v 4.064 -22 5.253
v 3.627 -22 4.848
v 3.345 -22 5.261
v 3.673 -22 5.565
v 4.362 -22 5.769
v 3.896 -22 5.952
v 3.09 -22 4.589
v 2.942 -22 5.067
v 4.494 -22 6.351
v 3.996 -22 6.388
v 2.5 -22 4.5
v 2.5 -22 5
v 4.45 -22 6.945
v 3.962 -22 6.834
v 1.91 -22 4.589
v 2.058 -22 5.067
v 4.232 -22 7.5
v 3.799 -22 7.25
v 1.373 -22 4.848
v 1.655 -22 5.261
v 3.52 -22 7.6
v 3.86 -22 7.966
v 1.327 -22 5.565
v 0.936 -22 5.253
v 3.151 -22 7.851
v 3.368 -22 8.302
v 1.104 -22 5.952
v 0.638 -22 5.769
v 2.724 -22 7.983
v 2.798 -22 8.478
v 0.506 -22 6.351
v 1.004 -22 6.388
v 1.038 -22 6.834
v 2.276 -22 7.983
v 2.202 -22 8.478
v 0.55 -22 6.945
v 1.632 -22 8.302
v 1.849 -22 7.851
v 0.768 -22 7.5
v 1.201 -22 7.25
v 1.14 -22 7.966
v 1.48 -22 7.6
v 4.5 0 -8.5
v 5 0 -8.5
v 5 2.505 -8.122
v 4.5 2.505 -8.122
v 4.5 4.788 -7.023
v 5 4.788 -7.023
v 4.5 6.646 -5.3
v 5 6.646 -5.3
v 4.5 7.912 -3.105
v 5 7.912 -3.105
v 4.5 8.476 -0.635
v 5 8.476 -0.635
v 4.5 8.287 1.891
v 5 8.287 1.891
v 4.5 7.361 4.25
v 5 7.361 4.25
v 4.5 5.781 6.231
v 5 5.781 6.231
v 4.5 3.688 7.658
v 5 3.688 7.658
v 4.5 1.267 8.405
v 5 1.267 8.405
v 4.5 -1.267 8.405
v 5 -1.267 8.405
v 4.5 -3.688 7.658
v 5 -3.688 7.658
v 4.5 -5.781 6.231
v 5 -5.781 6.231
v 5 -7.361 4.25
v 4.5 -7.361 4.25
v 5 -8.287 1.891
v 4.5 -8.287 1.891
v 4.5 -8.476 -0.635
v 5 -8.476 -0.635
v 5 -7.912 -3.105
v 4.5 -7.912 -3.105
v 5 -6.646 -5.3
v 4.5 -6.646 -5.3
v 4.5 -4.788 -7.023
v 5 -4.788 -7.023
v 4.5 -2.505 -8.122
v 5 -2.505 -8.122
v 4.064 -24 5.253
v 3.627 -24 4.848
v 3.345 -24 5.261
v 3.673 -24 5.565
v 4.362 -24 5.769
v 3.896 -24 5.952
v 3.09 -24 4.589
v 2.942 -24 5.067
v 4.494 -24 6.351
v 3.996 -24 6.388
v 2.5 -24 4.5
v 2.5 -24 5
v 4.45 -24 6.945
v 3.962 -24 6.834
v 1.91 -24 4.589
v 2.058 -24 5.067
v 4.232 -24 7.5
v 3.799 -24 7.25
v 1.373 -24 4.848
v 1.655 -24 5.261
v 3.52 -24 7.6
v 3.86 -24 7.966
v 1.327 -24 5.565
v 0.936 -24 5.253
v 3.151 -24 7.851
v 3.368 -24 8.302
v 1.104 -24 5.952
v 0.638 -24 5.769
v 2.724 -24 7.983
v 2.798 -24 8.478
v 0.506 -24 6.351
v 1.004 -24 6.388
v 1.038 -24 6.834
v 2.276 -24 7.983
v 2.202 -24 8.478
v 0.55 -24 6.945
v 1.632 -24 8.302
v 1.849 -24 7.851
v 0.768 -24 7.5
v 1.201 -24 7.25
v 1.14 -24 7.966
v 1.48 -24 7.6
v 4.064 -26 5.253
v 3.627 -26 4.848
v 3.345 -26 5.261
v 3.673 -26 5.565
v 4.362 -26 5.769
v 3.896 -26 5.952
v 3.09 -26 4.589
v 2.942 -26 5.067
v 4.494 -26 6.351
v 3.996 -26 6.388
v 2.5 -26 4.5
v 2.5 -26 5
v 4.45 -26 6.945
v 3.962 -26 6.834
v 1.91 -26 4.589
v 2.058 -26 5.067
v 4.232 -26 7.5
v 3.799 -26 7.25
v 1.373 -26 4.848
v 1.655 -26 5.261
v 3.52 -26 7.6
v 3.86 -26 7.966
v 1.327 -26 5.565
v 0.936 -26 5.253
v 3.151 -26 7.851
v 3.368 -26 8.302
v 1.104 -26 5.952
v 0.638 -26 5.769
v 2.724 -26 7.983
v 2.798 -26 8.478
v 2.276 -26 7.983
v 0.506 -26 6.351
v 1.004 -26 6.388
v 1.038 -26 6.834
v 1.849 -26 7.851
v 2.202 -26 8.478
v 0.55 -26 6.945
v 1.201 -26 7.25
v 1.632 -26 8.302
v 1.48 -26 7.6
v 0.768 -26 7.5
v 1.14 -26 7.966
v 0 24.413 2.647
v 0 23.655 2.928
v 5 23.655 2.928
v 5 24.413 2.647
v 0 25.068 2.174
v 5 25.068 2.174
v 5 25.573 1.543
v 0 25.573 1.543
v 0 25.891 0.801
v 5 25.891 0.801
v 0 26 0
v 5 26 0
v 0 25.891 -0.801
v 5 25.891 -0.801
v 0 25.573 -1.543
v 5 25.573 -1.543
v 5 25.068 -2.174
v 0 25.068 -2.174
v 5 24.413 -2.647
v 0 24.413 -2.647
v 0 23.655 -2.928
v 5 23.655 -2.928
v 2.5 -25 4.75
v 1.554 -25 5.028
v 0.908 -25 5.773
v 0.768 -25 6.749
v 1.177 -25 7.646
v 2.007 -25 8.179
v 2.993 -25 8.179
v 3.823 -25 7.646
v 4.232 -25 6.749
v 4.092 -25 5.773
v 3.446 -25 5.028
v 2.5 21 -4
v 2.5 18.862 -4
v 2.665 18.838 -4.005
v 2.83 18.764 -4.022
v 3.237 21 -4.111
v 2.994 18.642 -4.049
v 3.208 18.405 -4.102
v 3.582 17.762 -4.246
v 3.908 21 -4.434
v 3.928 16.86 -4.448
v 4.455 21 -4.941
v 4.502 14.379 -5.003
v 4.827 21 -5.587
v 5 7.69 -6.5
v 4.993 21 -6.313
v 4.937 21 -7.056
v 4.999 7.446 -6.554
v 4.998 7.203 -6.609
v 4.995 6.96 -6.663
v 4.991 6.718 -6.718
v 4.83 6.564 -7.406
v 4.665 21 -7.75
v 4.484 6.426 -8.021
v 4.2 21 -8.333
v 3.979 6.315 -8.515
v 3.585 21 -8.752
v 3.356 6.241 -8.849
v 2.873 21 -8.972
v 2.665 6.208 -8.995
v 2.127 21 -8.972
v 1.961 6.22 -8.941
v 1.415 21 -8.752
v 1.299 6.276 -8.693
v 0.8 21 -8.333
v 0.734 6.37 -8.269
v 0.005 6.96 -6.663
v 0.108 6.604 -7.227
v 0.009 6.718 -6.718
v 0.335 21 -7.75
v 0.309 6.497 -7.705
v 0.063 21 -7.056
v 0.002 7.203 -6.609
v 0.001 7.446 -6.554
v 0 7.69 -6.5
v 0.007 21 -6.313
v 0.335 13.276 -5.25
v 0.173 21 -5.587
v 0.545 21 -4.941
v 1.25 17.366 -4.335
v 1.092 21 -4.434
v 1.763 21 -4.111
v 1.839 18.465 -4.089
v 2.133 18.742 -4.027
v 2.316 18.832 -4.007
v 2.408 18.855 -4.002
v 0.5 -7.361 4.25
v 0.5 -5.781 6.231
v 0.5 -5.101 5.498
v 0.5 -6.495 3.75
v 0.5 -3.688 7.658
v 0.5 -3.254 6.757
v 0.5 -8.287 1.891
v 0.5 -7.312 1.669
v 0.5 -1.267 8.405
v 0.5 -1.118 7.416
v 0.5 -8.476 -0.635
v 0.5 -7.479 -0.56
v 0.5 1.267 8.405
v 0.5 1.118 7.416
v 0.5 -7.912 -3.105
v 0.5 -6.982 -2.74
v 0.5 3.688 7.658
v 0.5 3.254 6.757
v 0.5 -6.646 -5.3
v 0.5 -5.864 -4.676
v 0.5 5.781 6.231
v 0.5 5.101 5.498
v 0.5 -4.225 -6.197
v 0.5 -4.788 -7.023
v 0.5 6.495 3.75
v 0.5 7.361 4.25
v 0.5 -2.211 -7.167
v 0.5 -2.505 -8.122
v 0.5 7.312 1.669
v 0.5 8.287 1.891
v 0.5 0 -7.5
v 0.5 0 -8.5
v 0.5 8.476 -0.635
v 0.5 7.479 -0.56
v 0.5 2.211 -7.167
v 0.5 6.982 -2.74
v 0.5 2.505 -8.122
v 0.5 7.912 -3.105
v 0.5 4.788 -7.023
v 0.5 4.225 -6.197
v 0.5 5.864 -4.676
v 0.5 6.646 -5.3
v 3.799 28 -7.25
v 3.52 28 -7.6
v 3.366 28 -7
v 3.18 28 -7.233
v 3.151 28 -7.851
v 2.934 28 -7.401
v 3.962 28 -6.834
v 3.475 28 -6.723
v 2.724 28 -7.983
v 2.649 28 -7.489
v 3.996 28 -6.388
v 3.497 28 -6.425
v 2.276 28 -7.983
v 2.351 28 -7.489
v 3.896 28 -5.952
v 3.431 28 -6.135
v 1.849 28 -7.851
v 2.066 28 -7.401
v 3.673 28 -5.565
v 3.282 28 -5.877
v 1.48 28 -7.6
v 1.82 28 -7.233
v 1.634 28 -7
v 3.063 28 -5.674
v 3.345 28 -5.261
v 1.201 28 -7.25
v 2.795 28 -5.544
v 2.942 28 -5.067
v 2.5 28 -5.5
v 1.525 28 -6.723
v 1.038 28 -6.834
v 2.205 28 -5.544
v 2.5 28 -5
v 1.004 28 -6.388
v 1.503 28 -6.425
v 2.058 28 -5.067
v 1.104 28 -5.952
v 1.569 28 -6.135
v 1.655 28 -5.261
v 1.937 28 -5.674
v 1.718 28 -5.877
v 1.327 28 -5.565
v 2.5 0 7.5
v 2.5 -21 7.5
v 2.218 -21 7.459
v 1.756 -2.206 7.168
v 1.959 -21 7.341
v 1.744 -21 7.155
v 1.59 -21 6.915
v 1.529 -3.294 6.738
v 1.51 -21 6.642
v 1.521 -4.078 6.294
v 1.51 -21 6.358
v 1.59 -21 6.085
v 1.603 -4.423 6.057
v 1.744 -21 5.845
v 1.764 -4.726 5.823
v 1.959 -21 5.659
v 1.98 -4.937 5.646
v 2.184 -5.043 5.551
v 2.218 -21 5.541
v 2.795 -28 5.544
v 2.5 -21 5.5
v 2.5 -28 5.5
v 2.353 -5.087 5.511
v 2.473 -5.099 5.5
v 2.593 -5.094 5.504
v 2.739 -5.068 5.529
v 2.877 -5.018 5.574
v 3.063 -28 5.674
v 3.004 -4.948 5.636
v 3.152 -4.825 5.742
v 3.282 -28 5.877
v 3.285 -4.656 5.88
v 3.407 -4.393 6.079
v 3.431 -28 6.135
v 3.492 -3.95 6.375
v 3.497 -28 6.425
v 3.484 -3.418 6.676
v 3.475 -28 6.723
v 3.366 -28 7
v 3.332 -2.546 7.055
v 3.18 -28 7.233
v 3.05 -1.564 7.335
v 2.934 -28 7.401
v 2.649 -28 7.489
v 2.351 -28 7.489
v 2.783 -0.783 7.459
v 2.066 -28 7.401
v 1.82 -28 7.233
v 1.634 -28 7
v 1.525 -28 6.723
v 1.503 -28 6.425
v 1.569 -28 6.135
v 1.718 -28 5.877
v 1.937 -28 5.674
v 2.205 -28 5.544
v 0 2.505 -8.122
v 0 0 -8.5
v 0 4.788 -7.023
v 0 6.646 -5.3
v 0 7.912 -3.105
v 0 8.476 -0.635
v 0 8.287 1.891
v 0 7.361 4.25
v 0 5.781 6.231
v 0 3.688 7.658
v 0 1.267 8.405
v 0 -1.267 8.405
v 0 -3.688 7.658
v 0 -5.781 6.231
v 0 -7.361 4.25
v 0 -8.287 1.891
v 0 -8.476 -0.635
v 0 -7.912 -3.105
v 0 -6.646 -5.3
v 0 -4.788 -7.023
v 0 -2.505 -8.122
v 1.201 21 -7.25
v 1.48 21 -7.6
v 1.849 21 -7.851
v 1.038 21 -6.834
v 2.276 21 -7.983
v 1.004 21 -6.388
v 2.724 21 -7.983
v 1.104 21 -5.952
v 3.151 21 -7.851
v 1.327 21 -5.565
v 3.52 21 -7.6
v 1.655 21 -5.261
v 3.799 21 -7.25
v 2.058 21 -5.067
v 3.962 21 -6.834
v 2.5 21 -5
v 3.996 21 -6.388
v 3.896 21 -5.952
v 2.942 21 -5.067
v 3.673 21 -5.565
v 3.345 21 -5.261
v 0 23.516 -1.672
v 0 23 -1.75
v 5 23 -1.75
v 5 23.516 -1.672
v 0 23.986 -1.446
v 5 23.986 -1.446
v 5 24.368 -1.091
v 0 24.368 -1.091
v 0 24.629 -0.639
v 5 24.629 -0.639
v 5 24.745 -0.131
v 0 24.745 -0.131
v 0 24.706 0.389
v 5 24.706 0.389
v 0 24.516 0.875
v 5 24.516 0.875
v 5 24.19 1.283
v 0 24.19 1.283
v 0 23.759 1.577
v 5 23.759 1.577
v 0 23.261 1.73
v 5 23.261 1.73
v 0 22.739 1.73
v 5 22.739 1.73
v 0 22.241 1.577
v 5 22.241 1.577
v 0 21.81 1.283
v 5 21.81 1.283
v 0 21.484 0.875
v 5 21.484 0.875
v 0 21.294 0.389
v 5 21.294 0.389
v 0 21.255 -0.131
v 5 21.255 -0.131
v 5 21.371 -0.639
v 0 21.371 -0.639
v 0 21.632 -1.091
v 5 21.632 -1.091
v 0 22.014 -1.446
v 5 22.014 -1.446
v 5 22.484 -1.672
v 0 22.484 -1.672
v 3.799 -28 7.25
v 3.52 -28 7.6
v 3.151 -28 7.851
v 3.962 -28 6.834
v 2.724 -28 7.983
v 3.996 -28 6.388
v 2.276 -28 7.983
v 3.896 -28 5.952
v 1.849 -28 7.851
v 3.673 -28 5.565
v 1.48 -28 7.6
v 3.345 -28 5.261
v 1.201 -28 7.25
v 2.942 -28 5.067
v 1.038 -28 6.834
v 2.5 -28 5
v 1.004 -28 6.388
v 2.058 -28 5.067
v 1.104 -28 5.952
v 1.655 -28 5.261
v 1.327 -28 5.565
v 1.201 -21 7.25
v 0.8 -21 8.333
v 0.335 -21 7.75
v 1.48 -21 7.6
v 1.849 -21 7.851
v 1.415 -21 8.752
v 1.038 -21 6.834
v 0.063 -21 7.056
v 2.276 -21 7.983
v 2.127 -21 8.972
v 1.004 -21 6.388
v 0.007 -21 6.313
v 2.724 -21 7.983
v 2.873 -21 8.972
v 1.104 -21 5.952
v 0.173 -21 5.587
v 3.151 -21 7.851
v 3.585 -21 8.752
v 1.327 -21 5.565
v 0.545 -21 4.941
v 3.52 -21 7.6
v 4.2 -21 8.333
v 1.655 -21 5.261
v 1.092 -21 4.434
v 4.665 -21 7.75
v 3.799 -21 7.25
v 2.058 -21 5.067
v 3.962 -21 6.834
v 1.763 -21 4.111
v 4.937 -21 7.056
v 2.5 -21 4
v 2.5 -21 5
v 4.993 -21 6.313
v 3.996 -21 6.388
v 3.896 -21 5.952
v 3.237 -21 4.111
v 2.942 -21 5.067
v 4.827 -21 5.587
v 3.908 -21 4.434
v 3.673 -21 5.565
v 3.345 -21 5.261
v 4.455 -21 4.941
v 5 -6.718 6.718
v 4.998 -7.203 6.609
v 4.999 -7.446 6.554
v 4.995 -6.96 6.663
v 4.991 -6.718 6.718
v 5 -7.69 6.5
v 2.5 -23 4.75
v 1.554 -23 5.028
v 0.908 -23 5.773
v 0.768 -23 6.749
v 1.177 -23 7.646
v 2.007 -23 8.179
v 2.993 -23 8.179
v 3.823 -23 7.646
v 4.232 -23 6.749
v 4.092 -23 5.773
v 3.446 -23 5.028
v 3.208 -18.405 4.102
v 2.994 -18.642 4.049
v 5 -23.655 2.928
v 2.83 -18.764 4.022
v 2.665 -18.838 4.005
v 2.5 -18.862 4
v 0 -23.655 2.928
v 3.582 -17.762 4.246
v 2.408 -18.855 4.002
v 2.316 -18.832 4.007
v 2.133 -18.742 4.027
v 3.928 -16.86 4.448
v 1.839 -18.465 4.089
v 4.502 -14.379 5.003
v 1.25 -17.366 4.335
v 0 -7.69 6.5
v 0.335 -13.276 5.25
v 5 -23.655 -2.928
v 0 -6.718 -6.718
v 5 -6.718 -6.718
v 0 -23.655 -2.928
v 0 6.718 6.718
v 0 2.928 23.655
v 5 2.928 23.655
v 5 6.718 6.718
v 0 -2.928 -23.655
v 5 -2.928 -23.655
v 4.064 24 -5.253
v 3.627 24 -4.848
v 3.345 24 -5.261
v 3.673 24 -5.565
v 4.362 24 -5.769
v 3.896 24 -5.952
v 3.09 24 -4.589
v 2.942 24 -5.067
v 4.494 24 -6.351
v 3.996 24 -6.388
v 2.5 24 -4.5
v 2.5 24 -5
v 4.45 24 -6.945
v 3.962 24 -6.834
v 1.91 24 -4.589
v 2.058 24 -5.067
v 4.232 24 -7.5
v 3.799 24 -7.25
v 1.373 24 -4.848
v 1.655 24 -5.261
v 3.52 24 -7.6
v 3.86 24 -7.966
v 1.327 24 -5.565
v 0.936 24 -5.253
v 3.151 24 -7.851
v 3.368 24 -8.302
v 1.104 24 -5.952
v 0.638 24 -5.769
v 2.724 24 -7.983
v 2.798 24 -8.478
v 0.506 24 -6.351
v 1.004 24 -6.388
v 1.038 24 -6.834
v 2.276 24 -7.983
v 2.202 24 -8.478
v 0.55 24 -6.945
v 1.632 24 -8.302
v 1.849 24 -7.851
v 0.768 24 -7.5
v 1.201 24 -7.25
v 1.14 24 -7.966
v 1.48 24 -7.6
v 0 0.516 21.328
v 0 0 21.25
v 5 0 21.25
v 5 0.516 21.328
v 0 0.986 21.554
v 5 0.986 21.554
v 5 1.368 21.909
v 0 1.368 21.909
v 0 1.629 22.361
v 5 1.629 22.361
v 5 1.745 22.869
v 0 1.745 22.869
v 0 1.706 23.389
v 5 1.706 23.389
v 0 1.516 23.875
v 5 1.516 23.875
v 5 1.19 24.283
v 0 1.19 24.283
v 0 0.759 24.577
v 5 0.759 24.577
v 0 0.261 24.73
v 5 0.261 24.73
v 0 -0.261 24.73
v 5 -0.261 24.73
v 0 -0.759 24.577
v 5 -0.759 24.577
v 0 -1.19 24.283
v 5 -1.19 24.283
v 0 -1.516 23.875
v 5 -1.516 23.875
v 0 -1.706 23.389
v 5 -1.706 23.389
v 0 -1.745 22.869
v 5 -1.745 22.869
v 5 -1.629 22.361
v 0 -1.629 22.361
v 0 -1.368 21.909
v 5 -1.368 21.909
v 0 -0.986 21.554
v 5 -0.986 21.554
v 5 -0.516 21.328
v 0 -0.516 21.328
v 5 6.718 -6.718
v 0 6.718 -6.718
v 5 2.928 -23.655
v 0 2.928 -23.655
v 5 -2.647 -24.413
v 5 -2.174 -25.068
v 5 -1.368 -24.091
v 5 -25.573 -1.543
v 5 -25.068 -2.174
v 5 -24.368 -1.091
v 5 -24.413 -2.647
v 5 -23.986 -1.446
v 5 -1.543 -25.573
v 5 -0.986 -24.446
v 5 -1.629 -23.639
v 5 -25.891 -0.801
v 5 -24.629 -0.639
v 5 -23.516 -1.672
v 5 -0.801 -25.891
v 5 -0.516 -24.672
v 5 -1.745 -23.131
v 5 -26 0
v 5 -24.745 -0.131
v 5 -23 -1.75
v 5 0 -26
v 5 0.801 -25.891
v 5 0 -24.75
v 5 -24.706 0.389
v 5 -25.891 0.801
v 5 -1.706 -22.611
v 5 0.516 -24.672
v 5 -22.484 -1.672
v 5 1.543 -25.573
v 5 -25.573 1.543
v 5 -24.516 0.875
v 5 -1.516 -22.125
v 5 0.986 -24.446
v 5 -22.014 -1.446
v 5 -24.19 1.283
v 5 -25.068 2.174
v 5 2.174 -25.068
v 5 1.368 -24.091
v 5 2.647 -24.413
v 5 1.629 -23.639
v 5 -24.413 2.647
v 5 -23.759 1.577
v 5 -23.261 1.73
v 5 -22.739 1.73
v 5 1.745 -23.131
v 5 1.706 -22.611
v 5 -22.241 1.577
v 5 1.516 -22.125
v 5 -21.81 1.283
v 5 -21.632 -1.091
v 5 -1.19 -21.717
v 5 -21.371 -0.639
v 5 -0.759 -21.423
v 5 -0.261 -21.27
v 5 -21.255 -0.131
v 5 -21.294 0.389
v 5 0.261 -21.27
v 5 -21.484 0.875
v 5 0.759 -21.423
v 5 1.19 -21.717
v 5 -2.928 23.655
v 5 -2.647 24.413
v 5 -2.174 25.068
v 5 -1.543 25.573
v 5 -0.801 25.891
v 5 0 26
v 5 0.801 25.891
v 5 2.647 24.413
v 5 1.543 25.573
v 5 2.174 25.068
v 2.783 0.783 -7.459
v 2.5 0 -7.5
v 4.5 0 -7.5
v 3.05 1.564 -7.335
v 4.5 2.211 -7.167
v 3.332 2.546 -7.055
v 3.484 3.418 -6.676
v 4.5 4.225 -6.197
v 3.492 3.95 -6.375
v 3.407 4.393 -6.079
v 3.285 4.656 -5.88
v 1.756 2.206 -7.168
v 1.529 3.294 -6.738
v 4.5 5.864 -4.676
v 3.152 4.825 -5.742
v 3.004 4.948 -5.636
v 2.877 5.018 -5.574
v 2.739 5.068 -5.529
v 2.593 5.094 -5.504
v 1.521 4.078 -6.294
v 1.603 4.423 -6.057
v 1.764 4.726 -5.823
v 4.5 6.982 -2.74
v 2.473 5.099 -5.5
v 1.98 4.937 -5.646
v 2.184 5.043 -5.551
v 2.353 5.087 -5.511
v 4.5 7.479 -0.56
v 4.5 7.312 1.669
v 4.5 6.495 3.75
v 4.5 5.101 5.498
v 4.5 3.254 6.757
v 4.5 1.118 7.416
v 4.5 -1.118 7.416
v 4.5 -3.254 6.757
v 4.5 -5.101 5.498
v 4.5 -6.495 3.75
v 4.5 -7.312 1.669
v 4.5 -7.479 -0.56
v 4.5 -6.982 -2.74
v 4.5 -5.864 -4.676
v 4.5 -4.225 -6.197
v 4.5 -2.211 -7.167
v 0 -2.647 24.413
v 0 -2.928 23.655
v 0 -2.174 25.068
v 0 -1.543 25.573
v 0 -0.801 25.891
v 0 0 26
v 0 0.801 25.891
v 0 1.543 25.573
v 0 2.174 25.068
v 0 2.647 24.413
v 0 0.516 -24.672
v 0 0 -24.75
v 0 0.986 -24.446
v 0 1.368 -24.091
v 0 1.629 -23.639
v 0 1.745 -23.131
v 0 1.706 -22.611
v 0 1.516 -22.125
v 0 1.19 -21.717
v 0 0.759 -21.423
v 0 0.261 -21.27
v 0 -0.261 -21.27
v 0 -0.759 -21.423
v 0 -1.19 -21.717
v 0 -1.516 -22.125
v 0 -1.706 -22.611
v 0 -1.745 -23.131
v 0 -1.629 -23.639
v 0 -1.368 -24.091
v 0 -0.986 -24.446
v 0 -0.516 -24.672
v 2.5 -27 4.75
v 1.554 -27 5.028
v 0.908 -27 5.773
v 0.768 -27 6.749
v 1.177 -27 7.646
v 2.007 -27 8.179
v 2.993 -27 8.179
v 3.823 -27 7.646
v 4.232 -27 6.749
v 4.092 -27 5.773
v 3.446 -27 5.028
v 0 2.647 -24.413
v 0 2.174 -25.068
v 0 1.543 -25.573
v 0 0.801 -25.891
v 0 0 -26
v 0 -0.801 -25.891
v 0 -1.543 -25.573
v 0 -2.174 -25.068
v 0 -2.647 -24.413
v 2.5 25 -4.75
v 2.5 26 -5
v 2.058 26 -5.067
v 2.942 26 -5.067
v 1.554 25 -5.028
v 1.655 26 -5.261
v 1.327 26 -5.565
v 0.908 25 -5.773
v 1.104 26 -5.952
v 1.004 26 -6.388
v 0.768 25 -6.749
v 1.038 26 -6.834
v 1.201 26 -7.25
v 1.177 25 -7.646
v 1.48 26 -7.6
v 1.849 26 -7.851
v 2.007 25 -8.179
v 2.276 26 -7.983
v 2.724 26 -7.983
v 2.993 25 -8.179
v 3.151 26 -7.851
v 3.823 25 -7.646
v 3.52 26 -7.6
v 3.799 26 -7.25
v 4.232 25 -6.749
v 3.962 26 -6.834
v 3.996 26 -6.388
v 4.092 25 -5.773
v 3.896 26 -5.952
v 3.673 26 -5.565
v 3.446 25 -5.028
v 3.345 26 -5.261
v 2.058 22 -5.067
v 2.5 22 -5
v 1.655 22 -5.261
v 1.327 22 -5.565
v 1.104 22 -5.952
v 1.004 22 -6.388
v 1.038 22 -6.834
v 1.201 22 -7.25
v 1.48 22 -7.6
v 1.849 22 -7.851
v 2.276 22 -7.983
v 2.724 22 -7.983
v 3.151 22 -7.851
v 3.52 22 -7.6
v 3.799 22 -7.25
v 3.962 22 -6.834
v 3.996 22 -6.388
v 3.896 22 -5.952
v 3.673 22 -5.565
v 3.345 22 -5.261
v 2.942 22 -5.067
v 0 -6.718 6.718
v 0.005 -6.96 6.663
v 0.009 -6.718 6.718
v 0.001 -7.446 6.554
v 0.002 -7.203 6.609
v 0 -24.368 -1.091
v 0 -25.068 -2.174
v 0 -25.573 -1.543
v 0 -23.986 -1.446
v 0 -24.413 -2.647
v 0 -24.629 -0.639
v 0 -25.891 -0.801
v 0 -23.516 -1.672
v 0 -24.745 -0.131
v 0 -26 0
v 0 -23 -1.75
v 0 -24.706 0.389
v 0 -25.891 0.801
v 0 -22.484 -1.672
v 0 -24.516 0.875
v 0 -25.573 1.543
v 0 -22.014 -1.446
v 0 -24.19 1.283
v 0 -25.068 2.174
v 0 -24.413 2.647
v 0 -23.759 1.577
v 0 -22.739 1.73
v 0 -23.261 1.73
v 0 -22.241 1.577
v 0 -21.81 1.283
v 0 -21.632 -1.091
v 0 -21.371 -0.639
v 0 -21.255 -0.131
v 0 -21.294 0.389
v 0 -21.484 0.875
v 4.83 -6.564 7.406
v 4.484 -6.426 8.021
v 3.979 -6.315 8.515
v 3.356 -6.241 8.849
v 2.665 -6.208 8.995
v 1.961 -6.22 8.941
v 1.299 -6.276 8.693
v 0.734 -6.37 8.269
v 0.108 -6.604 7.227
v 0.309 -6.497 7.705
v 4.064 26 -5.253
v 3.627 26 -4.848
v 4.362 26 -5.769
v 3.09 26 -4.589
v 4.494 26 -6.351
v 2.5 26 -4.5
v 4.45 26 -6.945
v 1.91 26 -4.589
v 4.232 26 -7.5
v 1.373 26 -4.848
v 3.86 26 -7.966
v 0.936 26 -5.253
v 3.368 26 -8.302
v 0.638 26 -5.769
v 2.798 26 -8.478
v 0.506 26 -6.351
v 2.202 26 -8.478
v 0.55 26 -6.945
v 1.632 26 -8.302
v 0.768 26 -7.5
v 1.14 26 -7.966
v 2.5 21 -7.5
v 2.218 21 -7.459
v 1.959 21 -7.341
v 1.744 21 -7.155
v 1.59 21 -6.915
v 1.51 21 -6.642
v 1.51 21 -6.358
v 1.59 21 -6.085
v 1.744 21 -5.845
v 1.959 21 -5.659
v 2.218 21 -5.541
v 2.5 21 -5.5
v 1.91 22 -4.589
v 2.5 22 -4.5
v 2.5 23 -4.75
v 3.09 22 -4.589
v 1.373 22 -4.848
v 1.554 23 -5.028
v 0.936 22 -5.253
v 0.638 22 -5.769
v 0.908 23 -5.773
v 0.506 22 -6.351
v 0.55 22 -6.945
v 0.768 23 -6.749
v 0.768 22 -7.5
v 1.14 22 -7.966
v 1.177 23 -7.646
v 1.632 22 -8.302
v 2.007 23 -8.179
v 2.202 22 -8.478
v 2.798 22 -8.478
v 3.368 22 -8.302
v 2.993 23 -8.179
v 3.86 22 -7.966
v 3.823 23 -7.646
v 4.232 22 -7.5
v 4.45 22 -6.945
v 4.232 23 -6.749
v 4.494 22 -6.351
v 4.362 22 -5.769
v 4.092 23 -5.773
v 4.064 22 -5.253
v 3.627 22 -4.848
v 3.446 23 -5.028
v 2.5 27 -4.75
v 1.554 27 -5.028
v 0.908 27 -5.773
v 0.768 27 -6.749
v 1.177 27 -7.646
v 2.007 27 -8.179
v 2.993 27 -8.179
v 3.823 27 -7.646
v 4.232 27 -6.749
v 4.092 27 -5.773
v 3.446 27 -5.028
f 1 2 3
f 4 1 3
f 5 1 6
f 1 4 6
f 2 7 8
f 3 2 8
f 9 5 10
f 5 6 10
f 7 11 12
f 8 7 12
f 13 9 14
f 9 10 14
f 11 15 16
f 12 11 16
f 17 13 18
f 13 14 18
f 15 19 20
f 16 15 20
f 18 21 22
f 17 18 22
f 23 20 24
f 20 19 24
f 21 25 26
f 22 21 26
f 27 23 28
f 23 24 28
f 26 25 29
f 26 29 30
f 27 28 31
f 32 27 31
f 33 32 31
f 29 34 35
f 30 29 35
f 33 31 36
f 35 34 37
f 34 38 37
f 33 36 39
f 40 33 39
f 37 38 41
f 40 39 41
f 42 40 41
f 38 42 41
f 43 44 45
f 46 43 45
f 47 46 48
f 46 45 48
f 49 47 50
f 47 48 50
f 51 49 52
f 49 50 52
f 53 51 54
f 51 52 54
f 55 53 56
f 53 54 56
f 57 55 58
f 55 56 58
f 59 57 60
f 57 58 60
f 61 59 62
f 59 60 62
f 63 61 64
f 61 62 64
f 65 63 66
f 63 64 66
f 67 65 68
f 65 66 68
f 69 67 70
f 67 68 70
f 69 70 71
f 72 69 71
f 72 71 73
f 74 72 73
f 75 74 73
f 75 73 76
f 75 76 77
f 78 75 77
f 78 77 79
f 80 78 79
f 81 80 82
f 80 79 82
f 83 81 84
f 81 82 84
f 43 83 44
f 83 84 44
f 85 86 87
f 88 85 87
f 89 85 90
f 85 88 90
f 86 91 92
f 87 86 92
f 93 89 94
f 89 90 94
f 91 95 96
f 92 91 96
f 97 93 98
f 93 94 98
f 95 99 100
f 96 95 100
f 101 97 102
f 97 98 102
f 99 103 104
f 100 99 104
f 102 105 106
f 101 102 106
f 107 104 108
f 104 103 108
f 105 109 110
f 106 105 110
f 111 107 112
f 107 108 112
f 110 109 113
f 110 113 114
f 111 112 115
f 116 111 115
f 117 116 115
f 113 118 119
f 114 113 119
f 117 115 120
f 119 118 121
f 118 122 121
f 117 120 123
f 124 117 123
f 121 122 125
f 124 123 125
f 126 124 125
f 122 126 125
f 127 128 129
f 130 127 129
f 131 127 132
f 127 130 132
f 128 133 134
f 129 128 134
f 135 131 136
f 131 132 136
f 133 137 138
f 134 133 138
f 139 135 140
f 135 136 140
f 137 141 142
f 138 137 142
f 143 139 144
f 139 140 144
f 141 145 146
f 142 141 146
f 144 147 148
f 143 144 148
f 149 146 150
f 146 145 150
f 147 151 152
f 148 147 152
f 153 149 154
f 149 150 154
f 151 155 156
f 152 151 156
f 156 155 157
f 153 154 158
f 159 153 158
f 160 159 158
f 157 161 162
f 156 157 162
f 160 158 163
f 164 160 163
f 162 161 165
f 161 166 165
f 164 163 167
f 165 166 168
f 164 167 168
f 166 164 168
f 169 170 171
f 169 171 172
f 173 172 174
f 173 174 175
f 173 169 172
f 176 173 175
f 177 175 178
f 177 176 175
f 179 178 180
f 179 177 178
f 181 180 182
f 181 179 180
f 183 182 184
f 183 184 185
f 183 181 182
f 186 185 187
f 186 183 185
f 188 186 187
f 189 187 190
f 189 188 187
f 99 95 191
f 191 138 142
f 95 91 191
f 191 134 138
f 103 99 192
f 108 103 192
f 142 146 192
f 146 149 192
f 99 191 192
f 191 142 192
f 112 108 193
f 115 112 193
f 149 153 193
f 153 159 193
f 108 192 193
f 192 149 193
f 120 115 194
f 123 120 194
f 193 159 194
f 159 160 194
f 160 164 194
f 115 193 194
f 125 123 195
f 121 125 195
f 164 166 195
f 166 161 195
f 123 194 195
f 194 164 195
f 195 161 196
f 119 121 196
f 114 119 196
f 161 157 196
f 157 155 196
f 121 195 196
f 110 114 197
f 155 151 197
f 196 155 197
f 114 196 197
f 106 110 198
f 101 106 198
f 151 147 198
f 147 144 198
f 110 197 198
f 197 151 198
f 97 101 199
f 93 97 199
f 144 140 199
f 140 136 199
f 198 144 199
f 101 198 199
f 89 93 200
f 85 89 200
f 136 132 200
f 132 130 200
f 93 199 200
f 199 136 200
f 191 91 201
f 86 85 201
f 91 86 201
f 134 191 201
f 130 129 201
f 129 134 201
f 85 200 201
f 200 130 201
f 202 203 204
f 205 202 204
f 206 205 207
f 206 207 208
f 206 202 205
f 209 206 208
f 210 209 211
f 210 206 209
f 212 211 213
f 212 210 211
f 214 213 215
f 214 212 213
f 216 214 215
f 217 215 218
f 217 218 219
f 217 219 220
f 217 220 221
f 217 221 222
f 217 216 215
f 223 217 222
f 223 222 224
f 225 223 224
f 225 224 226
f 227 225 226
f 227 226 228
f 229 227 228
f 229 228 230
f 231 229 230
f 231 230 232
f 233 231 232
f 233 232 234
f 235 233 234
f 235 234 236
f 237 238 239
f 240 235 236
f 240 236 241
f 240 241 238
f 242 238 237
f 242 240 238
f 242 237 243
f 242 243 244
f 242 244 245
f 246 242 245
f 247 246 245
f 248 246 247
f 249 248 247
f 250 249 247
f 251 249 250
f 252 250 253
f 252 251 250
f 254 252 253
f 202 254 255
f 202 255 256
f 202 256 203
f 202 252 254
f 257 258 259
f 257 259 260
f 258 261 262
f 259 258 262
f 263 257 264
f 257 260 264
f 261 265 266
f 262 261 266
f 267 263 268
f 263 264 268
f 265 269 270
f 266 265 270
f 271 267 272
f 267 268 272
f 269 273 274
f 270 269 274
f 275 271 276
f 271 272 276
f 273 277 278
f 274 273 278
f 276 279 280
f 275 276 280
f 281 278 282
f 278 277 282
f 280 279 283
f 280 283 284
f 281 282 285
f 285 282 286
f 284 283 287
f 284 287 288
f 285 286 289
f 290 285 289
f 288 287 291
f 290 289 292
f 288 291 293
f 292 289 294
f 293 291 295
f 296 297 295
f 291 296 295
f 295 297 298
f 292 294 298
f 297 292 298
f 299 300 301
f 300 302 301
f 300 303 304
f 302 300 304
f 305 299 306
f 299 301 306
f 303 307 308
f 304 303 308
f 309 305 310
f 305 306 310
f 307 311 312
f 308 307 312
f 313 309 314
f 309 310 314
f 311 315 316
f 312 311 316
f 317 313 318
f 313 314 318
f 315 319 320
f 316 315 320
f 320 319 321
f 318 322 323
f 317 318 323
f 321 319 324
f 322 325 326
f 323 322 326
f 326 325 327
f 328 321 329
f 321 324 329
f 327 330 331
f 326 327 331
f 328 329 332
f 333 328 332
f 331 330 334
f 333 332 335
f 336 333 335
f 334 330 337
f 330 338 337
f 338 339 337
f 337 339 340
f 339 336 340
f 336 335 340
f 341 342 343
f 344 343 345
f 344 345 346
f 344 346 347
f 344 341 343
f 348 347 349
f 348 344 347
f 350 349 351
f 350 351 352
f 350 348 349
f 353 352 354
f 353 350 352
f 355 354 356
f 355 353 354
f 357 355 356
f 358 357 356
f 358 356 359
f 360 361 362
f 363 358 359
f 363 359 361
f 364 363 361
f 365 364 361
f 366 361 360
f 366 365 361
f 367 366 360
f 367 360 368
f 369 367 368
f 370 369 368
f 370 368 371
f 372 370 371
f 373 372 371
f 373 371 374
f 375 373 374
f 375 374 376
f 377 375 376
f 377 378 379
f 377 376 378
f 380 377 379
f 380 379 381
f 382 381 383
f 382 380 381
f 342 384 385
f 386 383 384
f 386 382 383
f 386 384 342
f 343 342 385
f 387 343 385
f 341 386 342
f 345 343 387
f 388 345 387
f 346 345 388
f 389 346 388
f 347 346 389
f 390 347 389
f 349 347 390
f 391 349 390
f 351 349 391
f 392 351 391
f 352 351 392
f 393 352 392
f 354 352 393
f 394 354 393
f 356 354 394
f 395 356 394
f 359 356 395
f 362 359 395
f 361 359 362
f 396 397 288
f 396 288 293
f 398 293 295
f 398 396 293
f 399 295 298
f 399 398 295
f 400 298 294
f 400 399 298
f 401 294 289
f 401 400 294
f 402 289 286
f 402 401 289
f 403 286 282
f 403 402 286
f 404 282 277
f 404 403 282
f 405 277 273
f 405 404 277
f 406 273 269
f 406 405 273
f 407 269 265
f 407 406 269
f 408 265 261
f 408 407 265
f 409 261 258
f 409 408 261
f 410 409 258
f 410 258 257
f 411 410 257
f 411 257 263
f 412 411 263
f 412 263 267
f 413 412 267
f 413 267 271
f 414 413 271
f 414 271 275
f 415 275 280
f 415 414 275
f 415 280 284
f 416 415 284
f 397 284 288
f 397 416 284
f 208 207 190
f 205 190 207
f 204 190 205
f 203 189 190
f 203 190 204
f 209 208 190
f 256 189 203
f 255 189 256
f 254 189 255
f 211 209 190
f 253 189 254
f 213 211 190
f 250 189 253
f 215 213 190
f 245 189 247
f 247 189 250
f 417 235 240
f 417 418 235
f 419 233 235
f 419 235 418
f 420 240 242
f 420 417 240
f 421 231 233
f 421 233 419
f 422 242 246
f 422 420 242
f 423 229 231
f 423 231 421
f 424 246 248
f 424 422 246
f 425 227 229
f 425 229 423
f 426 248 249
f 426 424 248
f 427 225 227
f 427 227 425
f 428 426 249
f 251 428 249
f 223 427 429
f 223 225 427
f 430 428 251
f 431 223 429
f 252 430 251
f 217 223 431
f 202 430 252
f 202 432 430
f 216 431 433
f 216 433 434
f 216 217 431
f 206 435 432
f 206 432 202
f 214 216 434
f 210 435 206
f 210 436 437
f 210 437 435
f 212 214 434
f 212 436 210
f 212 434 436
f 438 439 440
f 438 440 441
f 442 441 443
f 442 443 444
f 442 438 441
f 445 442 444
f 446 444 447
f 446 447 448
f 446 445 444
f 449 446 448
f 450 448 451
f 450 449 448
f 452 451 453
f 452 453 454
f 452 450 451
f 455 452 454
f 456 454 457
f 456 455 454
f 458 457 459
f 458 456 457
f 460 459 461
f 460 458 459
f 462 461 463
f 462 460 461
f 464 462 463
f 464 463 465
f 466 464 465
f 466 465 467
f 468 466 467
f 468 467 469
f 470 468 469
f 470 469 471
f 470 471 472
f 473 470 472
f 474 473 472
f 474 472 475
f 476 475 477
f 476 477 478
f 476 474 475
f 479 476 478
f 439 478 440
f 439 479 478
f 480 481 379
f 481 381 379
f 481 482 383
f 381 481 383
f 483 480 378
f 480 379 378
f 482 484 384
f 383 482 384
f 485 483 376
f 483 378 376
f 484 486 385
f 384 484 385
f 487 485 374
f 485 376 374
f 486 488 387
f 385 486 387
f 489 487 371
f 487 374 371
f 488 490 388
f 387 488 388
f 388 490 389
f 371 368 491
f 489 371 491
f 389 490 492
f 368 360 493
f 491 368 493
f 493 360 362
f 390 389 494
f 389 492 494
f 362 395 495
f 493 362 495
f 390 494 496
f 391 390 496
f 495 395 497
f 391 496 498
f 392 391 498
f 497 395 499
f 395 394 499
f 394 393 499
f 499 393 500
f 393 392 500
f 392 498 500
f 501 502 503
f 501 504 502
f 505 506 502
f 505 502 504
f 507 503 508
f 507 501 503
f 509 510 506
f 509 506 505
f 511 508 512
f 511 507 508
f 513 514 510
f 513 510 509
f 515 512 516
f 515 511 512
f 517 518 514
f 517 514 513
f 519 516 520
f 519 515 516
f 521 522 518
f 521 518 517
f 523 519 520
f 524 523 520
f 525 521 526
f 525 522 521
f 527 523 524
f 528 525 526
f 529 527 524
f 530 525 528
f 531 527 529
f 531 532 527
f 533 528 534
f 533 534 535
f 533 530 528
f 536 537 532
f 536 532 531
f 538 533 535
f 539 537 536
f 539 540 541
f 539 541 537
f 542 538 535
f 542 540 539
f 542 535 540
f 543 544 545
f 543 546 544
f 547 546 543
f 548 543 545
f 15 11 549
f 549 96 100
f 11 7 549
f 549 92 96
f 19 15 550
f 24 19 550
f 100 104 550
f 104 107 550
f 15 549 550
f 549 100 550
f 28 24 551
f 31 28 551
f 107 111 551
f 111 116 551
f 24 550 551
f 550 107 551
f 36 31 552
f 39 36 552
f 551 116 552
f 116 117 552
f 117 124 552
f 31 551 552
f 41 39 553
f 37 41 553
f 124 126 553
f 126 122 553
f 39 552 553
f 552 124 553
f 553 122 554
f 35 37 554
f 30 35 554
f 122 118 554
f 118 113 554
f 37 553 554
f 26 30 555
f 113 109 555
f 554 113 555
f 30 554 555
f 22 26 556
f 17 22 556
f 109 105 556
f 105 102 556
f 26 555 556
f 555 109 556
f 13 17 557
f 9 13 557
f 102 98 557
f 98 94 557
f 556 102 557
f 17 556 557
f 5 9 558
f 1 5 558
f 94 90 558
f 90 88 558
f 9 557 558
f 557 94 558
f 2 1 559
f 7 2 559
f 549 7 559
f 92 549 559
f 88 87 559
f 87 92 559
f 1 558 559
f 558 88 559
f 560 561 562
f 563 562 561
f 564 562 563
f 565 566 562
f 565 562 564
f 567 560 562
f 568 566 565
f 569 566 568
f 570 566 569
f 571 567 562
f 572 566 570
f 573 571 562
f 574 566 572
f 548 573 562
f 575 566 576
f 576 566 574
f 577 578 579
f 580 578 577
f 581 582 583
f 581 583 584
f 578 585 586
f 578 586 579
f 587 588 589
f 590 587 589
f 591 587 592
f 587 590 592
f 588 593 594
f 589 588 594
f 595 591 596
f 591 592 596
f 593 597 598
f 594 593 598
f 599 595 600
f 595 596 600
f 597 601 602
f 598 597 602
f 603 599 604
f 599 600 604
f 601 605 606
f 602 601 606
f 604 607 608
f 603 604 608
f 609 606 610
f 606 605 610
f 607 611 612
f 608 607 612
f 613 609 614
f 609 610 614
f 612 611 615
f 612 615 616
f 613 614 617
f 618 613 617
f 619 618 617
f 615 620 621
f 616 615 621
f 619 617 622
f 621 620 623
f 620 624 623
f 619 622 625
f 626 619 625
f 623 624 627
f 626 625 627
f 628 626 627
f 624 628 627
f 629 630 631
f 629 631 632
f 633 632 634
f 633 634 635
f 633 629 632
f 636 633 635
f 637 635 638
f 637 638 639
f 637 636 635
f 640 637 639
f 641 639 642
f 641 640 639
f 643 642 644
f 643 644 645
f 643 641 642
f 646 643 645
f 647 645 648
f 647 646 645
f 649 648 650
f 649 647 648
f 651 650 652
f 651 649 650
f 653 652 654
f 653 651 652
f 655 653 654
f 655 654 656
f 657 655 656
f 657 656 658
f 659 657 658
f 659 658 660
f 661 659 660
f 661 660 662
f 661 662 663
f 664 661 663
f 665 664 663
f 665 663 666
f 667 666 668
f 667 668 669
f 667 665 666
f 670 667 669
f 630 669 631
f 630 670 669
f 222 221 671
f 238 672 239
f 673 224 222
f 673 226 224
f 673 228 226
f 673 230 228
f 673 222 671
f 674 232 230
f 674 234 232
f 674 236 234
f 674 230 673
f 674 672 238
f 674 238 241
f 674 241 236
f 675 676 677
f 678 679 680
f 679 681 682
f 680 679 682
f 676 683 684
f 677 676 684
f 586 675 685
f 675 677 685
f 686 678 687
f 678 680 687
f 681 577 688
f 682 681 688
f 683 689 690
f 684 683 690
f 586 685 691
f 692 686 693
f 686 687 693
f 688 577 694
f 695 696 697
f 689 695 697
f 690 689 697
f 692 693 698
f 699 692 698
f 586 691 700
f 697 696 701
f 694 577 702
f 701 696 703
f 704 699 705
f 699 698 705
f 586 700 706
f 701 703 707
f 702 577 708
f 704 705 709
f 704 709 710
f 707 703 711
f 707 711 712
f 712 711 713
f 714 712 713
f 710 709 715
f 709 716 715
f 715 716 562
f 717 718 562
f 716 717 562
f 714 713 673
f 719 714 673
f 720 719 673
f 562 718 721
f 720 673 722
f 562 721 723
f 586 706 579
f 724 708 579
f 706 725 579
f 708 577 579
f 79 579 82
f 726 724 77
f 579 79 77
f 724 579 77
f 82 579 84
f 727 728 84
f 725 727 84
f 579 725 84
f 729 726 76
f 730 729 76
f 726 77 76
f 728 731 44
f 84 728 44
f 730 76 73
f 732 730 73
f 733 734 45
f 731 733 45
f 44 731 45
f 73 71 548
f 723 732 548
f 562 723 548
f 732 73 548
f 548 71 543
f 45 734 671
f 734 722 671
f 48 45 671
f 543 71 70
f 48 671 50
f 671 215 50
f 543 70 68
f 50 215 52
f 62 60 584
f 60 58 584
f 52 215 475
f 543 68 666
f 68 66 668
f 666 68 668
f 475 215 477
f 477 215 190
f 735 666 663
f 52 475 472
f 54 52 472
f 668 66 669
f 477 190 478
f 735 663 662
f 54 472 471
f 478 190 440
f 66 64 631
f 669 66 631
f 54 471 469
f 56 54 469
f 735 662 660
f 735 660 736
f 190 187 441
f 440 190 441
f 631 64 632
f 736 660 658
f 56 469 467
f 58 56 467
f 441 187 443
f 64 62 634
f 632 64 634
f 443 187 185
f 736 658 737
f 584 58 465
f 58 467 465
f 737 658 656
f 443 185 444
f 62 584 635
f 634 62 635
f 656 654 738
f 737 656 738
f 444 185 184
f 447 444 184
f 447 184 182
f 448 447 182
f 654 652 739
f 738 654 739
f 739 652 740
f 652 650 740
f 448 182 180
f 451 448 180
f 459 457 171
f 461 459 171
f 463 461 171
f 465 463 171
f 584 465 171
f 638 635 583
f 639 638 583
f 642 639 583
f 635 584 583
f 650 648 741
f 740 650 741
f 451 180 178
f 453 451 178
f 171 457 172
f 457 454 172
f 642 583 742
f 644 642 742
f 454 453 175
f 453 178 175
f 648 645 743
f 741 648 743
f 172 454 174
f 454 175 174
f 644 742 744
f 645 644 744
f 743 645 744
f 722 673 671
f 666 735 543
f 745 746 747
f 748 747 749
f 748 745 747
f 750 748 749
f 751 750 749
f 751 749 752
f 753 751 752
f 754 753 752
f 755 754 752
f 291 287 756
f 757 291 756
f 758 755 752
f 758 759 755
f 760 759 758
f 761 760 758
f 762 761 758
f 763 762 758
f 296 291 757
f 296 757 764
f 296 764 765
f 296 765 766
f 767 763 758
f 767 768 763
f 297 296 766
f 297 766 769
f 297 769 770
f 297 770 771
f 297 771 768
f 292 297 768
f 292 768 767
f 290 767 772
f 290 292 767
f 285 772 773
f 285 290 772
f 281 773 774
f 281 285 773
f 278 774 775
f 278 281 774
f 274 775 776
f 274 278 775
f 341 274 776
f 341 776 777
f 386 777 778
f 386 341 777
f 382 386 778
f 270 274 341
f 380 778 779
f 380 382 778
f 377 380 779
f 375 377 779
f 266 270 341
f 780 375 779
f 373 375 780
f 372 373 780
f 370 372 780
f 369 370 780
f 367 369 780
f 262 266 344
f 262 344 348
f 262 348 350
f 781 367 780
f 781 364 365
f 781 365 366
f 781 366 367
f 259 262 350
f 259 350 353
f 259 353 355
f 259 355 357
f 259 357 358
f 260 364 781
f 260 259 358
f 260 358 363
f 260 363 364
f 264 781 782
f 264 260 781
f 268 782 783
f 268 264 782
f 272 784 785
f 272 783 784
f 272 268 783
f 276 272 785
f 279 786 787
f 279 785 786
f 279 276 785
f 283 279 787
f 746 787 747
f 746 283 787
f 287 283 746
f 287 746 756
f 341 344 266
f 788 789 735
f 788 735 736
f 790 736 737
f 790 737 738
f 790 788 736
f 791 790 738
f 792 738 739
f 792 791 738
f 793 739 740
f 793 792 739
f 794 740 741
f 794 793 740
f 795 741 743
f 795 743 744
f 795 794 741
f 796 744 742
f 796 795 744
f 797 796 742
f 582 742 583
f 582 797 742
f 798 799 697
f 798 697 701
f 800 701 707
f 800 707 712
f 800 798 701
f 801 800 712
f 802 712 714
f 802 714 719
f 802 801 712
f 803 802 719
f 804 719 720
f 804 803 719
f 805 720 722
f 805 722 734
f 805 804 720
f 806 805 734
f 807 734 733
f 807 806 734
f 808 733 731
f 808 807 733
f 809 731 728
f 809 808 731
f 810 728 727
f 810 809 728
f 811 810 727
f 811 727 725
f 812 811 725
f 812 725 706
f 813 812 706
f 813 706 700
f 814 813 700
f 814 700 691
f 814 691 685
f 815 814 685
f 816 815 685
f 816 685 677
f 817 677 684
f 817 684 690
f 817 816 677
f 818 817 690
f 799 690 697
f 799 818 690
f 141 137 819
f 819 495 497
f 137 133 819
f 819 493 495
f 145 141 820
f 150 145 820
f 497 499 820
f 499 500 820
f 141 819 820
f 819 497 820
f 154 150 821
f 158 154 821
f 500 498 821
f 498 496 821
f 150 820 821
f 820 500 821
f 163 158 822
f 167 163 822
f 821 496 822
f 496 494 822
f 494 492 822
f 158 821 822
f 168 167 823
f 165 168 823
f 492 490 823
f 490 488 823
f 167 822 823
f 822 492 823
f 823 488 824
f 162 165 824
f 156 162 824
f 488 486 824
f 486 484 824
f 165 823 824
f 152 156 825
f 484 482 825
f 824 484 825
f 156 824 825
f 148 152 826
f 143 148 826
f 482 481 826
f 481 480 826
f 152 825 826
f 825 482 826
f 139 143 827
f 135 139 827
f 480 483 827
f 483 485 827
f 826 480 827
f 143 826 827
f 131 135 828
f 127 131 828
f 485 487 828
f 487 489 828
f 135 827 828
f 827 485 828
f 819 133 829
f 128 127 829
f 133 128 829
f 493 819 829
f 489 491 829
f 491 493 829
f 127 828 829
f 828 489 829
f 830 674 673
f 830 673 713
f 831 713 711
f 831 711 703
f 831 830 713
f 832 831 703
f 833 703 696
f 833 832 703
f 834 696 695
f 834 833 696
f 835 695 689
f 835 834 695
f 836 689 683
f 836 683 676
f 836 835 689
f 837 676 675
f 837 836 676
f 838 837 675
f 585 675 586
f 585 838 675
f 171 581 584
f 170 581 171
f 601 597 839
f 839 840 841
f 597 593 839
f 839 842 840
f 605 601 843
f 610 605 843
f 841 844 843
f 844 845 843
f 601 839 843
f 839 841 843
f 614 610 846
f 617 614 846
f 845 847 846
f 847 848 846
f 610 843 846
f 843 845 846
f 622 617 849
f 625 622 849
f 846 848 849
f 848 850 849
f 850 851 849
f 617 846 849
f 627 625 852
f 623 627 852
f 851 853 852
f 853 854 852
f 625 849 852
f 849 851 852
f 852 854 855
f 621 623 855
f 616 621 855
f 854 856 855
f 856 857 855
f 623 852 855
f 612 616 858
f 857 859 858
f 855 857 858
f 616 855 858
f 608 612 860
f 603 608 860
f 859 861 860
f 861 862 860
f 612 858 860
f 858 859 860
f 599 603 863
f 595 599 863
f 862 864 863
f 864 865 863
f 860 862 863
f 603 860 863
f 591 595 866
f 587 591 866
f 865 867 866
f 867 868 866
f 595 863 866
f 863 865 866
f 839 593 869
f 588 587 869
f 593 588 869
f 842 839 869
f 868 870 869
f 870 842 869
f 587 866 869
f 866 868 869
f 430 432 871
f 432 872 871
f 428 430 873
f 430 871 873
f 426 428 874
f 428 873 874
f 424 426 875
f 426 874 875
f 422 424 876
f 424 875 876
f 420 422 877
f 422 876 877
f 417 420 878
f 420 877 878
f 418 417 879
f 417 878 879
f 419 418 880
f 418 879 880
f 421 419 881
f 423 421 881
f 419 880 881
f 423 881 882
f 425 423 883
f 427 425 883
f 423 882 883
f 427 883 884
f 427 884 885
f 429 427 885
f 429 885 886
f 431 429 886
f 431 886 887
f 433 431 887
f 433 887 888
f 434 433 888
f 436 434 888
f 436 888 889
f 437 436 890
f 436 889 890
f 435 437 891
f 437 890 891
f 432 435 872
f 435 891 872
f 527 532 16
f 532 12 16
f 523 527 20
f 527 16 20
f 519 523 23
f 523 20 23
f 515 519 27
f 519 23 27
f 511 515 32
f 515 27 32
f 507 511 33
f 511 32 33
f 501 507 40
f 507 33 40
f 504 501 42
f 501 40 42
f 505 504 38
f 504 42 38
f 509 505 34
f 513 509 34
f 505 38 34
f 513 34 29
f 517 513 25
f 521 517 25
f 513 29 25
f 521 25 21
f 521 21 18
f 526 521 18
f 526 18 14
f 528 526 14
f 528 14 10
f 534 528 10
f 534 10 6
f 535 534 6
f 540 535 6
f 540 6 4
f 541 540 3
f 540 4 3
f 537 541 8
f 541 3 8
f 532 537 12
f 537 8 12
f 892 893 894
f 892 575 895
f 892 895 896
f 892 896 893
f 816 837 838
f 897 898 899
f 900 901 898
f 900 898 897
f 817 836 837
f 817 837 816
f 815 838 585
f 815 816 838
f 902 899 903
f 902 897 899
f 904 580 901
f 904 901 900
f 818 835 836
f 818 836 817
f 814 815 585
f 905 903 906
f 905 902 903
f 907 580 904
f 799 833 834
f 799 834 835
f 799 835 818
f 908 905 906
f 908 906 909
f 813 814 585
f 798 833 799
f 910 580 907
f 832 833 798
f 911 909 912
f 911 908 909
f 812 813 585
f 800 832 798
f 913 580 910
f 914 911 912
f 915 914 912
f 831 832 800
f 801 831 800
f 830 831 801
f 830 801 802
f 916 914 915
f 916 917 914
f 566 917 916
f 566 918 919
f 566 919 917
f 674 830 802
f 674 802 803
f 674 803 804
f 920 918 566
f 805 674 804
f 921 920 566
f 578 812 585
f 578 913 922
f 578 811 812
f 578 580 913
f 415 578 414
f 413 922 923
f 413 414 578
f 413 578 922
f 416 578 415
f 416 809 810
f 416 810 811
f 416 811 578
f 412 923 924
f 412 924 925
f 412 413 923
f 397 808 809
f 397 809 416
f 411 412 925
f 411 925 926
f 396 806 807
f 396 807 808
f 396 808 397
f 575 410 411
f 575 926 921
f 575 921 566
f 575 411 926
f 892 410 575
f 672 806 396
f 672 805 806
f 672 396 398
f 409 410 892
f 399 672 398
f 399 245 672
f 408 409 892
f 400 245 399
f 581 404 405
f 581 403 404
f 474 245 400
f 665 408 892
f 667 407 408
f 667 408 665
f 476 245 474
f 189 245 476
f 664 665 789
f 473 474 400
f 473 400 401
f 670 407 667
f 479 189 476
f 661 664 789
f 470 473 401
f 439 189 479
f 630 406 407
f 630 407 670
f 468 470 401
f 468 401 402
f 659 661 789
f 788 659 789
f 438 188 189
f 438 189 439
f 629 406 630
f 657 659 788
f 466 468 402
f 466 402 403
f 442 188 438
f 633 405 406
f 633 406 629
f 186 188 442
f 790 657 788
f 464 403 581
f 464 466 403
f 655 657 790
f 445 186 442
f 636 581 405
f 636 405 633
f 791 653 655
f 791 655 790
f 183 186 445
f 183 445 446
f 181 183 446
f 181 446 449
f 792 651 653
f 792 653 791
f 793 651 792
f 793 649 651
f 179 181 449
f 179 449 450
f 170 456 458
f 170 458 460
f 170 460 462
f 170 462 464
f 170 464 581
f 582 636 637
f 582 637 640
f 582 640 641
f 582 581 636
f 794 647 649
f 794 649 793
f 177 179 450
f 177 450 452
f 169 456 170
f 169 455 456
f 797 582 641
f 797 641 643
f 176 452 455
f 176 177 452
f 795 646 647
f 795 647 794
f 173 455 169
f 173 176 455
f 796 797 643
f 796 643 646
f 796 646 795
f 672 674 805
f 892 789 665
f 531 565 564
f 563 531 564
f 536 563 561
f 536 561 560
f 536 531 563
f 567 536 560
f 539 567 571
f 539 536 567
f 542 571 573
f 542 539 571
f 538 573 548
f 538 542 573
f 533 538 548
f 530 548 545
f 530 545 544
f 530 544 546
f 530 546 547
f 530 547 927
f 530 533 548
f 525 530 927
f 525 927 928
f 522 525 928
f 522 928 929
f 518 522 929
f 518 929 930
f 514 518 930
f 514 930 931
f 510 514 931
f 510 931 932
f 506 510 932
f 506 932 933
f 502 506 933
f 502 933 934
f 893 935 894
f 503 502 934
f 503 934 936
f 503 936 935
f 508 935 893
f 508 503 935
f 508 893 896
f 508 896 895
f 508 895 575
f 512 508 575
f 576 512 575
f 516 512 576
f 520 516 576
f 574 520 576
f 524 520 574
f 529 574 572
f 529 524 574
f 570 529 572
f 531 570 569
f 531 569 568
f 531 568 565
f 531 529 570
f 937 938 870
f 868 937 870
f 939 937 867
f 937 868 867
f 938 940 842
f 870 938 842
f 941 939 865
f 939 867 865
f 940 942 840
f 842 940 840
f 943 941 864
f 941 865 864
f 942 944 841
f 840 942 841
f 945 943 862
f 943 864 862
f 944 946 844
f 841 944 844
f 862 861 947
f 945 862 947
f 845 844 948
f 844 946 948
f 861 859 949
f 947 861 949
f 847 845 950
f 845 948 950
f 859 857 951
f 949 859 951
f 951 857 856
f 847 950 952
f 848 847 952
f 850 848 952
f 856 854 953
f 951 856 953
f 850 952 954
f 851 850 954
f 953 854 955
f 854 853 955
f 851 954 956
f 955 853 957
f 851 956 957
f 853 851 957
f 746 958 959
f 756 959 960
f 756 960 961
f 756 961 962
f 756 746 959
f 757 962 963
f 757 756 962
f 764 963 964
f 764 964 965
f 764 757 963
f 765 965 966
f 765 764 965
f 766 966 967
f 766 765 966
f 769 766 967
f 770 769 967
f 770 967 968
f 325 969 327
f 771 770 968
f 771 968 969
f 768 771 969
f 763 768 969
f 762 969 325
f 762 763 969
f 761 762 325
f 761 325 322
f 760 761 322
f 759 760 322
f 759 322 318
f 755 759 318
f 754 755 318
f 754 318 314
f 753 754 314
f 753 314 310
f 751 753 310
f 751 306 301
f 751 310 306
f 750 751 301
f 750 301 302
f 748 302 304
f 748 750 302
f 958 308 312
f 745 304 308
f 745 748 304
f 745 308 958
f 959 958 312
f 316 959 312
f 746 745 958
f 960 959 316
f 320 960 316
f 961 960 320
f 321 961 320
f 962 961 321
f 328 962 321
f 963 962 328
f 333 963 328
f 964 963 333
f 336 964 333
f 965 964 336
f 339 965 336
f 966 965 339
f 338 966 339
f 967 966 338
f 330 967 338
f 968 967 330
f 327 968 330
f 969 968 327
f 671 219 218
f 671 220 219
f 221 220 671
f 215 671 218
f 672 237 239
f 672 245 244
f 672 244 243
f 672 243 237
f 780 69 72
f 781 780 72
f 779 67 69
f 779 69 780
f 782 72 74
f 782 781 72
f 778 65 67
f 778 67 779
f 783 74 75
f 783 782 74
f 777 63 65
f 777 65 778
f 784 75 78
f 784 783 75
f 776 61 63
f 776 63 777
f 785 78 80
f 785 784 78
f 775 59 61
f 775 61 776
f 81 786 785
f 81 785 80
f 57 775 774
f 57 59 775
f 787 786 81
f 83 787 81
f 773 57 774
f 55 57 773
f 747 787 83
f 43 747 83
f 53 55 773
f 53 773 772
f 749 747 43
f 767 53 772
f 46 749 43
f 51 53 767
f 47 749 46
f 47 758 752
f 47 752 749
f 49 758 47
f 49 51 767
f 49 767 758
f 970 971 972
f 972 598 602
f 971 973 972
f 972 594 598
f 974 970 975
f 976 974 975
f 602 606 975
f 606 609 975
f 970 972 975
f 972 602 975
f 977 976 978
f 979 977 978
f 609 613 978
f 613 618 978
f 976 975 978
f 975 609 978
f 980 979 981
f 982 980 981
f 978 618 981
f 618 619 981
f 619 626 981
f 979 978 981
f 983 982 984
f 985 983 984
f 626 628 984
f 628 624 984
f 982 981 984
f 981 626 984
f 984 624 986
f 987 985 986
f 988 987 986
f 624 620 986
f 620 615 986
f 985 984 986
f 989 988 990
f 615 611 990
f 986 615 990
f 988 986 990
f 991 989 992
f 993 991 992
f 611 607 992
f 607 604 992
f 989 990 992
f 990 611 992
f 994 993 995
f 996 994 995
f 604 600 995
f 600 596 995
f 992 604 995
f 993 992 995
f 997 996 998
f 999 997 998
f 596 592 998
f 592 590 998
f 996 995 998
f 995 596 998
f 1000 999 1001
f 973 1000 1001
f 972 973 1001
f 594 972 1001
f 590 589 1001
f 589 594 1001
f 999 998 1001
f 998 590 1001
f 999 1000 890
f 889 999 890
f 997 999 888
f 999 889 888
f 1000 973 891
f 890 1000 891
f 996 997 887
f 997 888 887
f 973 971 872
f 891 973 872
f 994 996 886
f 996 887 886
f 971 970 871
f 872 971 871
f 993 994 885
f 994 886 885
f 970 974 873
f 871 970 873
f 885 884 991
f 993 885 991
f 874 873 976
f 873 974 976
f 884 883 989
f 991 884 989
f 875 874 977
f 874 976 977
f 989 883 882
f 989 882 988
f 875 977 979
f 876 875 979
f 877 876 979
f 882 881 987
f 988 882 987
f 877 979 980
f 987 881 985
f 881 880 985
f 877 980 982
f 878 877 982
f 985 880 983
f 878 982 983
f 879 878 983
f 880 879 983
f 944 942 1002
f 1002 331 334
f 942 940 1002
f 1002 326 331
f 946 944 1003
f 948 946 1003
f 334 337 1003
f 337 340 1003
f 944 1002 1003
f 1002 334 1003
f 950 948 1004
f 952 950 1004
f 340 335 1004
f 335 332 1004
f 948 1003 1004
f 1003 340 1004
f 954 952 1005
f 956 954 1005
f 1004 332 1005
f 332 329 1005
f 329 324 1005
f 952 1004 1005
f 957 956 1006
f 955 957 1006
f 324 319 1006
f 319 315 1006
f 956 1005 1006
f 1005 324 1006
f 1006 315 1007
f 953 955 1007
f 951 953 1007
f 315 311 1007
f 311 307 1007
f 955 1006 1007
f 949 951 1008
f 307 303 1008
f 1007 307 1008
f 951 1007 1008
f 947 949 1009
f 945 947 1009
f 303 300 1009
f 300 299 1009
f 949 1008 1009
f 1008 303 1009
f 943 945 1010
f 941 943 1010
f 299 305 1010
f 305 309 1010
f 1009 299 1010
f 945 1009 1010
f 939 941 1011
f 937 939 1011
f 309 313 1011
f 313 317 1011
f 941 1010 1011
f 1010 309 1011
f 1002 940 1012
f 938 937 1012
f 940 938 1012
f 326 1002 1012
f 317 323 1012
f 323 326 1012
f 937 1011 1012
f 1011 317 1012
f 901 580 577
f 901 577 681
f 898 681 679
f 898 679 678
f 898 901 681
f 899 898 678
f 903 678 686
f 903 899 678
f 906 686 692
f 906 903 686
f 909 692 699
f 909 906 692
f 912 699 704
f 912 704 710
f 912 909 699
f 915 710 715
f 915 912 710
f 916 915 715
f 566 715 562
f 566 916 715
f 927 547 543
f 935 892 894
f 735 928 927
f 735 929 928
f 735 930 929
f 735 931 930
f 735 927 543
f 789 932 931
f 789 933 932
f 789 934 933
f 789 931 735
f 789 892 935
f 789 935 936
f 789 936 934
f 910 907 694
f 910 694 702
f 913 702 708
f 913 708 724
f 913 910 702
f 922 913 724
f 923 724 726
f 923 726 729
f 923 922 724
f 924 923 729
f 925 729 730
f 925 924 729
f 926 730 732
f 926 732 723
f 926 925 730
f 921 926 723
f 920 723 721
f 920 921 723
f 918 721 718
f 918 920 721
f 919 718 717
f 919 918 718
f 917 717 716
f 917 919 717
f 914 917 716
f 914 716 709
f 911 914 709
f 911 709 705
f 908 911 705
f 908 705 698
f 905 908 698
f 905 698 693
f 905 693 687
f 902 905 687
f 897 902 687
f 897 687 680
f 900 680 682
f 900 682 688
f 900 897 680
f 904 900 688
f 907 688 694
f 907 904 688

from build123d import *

# Parameters (mm, degrees)
SKETCH2_R           = 1.75
SKETCH2_R_2         = 7.5
FLANGE_DEPTH        = 5
SKETCH3_R           = 8.5
O_RING_SEAT_DEPTH   = 0.5
SKETCH5_R           = 1
OUTLET_DEPTH        = 38.107950631
BOSS_EXTRUDE2_REACH = 55.944
SKETCH6_R           = 2.5
SKETCH6_R_2         = 1
CIRPATTERN1_COUNT   = 2


with BuildPart() as part:
    # Sketch2 → Flange (new body)
    with BuildSketch(Plane(origin=(0, 0, 0), x_dir=(0, 0, -1), z_dir=(1, 0, 0))):
        with BuildLine():
            Line((-6.717514421, 6.717514421), (-2.92760615, 23.655074219))
            ThreePointArc((-2.92760615, 23.655074219), (0, 26), (2.92760615, 23.655074219))
            Line((2.92760615, 23.655074219), (6.717514421, 6.717514421))
            Line((6.717514421, 6.717514421), (23.655074219, 2.92760615))
            ThreePointArc((23.655074219, 2.92760615), (26, 0), (23.655074219, -2.92760615))
            Line((23.655074219, -2.92760615), (6.717514421, -6.717514421))
            Line((6.717514421, -6.717514421), (2.92760615, -23.655074219))
            ThreePointArc((2.92760615, -23.655074219), (0, -26), (-2.92760615, -23.655074219))
            Line((-2.92760615, -23.655074219), (-6.717514421, -6.717514421))
            Line((-6.717514421, -6.717514421), (-23.655074219, -2.92760615))
            ThreePointArc((-23.655074219, -2.92760615), (-26, 0), (-23.655074219, 2.92760615))
            Line((-23.655074219, 2.92760615), (-6.717514421, 6.717514421))
        make_face()
        with Locations((0, 23)):
            Circle(SKETCH2_R, mode=Mode.SUBTRACT)
        with Locations((23, 0)):
            Circle(SKETCH2_R, mode=Mode.SUBTRACT)
        with Locations((0, -23)):
            Circle(SKETCH2_R, mode=Mode.SUBTRACT)
        with Locations((-23, 0)):
            Circle(SKETCH2_R, mode=Mode.SUBTRACT)
        Circle(SKETCH2_R_2, mode=Mode.SUBTRACT)
    extrude(amount=FLANGE_DEPTH)

    # Sketch3 → O-Ring Seat (cut)
    with BuildSketch(Plane(origin=(5, 0, 0), x_dir=(0, 0, -1), z_dir=(1, 0, 0))):
        Circle(SKETCH3_R)
    o_ring_seat = extrude(amount=-O_RING_SEAT_DEPTH, mode=Mode.SUBTRACT)

    # Mirror1: O-Ring Seat across plane
    add(o_ring_seat.mirror(Plane(origin=(2.5, 0, 0), x_dir=(0, 0, 1), z_dir=(1, 0, 0))), mode=Mode.SUBTRACT)

    # Sketch5 → Outlet (cut, through all)
    with BuildSketch(Plane(origin=(0, 0, 0), x_dir=(1, 0, 0), z_dir=(0, 1, 0))):
        with Locations(Location((2.5, 6.5, 0), (0, 0, 90))):
            Circle(SKETCH5_R)
    outlet = extrude(amount=OUTLET_DEPTH, mode=Mode.SUBTRACT)

    # Sketch6 → Boss-Extrude2 (add, up to next)
    with BuildSketch(Plane(origin=(0, 21, 0), x_dir=(1, 0, 0), z_dir=(0, 1, 0)), mode=Mode.PRIVATE) as boss_extrude2_sk1:
        with Locations(Location((2.5, 6.5, 0), (0, 0, 270))):
            Circle(SKETCH6_R)
        with Locations(Location((2.5, 6.5, 0), (0, 0, 90))):
            Circle(SKETCH6_R_2, mode=Mode.SUBTRACT)
    boss_extrude2_tool1 = extrude(boss_extrude2_sk1.sketch, amount=-BOSS_EXTRUDE2_REACH, mode=Mode.PRIVATE) - part.part
    boss_extrude2 = boss_extrude2_tool1.solids().sort_by_distance((2.5, 21, -8.929289))[0]
    add(boss_extrude2)

    # Sketch8 → Revolve1 (revolve)
    with BuildSketch(Plane(origin=(2.5, 0, 0), x_dir=(0, 0, -1), z_dir=(1, 0, 0))):
        Polygon((5, 21), (5, 22), (4.5, 22), (5, 24), (4.5, 24), (5, 26), (4.5, 26), (5, 28), (5.5, 28), (5.5, 21), align=None)
    revolve1 = revolve(axis=Axis((2.5, 26, -6.5), (0, -1, 0)))

    # CirPattern1: Outlet, Boss-Extrude2, Revolve1 ×2 about axis
    cirpattern1_axis = Axis((0.5, 0, 0), (-1, 0, 0))
    add([outlet.rotate(cirpattern1_axis, i * 360 / CIRPATTERN1_COUNT) for i in range(1, CIRPATTERN1_COUNT)], mode=Mode.SUBTRACT)
    add([boss_extrude2.rotate(cirpattern1_axis, i * 360 / CIRPATTERN1_COUNT) for i in range(1, CIRPATTERN1_COUNT)])
    add([revolve1.rotate(cirpattern1_axis, i * 360 / CIRPATTERN1_COUNT) for i in range(1, CIRPATTERN1_COUNT)])


solid = part.part
